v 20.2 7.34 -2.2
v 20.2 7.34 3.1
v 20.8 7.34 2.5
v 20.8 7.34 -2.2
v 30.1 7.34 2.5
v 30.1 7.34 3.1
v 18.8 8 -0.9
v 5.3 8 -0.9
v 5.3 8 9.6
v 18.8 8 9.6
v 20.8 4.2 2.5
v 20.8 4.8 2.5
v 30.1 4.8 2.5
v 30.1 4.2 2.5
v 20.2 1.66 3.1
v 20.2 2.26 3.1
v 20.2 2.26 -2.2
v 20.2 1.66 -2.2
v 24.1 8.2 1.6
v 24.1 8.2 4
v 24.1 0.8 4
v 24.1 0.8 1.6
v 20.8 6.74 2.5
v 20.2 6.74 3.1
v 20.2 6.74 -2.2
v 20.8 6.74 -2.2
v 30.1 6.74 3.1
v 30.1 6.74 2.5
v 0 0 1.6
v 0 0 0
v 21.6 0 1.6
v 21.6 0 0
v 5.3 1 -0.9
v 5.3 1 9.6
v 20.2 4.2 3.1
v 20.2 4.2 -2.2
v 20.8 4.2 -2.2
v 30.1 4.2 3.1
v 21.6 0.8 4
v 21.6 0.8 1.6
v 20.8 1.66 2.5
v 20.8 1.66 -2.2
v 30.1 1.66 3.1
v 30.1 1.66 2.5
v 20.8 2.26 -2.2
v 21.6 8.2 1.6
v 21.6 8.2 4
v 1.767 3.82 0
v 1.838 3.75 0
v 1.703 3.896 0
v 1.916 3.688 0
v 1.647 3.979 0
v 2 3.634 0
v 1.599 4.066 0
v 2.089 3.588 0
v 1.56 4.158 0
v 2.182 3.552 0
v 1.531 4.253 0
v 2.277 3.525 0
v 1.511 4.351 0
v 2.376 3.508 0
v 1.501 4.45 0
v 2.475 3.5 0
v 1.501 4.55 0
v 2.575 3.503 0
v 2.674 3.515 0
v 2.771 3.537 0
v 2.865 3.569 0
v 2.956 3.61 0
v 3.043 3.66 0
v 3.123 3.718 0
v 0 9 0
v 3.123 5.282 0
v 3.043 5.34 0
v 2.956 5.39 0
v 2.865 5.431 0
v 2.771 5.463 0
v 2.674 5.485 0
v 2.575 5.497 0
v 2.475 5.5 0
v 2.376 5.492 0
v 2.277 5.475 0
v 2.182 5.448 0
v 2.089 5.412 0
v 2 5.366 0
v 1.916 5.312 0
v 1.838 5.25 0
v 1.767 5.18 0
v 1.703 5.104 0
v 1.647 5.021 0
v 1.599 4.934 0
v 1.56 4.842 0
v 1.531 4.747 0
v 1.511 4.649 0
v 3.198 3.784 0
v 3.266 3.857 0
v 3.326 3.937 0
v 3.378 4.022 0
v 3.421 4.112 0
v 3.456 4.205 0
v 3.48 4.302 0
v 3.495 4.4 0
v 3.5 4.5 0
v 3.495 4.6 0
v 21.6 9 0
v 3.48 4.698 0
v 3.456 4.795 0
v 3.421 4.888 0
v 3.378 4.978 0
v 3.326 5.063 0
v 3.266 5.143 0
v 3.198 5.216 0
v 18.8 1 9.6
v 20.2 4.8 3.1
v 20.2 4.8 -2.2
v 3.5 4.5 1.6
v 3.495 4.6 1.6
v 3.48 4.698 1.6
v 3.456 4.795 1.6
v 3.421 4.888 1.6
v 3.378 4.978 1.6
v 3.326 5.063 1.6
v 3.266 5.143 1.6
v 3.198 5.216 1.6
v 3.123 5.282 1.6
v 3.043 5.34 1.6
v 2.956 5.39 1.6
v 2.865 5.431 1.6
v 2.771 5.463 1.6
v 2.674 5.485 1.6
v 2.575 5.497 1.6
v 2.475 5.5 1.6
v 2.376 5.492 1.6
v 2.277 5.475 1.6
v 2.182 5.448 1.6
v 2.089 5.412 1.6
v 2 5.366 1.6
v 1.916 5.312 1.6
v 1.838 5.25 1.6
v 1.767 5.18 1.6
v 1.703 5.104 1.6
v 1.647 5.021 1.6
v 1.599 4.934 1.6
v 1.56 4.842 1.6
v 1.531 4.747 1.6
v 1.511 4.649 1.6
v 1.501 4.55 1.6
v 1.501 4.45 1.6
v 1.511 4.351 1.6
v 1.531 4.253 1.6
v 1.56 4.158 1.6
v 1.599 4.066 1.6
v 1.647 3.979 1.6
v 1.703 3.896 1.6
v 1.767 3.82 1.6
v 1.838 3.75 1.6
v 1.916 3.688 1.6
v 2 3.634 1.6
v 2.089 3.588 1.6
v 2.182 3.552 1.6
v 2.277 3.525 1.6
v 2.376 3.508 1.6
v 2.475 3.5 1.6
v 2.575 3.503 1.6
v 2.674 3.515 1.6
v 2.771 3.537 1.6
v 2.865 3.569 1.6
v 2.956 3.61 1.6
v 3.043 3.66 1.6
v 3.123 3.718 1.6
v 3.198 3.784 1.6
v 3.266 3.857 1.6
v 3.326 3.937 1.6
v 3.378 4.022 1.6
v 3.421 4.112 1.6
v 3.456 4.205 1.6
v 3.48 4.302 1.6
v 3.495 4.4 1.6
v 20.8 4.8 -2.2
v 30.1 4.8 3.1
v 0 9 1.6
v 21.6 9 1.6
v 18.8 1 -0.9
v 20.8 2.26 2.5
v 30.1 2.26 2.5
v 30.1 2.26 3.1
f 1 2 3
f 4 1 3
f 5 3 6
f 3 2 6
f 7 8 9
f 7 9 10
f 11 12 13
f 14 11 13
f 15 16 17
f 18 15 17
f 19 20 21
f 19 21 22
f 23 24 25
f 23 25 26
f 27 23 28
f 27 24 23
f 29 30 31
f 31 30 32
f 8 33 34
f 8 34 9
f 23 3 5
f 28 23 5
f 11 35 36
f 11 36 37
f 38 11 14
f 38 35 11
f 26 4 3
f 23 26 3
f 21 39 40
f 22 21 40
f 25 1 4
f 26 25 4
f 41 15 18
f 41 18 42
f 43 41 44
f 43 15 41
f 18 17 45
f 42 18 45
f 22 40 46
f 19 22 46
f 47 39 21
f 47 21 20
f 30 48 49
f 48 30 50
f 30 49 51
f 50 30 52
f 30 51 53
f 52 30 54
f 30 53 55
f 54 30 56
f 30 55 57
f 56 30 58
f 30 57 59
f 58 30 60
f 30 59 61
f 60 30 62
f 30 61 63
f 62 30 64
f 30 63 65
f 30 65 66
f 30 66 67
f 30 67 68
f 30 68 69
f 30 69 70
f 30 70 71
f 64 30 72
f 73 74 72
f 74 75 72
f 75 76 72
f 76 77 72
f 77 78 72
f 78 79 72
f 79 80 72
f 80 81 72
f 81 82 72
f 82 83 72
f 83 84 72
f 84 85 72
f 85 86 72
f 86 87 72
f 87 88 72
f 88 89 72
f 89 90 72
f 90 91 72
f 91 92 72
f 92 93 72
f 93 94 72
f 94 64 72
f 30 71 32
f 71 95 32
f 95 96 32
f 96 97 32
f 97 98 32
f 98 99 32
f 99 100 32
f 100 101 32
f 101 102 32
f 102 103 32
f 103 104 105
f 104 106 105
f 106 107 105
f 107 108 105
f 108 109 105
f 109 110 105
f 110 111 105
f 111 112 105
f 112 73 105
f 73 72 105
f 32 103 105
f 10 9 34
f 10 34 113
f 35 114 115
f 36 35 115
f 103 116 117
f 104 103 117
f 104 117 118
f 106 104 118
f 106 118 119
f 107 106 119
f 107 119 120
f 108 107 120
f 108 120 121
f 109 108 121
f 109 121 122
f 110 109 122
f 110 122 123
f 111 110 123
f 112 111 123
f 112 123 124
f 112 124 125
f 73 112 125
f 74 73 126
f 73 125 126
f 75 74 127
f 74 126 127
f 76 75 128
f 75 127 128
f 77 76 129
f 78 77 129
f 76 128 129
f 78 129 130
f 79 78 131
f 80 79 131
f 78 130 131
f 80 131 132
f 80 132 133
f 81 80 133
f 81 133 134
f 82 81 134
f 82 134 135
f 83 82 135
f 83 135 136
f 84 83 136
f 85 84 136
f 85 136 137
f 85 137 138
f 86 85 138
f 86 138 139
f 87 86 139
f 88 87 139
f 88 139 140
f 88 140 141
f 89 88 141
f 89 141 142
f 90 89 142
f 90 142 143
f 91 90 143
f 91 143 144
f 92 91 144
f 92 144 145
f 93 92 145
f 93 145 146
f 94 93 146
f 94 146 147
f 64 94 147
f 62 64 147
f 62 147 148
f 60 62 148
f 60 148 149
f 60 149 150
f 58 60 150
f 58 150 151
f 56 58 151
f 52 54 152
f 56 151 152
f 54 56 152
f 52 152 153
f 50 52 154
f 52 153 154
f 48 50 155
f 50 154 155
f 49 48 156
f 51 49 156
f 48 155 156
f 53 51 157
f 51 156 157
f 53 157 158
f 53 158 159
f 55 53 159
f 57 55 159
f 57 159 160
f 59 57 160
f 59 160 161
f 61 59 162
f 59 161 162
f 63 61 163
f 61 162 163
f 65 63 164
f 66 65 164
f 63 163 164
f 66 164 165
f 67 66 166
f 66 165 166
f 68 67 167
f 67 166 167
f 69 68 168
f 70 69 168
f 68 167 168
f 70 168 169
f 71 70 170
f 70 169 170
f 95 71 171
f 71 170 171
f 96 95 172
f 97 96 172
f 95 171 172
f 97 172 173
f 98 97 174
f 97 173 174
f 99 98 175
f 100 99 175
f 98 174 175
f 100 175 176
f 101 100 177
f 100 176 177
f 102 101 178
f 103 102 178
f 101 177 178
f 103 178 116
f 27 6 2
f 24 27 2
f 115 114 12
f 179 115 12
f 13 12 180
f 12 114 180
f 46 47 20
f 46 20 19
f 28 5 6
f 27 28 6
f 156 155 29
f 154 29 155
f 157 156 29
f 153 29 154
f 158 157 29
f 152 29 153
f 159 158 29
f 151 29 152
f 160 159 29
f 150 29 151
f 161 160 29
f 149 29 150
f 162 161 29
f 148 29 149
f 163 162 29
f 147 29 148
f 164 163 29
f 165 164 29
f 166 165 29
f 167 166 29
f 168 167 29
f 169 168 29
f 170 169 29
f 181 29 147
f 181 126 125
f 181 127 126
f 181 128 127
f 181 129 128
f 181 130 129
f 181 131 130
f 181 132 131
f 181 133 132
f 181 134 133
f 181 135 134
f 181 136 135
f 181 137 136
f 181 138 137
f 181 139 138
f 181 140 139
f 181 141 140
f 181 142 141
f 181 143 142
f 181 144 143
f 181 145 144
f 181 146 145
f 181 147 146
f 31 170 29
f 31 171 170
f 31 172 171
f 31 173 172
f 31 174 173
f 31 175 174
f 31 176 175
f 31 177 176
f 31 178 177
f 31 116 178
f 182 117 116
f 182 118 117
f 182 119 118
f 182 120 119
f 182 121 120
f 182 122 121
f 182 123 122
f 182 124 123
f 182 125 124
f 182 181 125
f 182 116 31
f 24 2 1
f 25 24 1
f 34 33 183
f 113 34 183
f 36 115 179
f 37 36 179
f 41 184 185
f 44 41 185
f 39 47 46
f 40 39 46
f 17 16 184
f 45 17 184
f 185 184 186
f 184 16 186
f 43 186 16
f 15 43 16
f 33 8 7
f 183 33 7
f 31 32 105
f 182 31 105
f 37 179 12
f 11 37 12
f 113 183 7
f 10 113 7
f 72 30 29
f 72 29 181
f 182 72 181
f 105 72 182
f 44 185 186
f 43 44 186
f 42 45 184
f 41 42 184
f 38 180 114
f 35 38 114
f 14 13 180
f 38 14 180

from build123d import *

# Parameters (mm, degrees)
ESQUISSE1_W                = 21.6
ESQUISSE1_H                = 9
BOSS_EXTRU_1_DEPTH         = 1.6
BOSS_EXTRU_2_DEPTH         = 8
BOSS_EXTRU_2_DEPTH_BACK    = 2.5
ESQUISSE2_W                = 13.5
ESQUISSE2_H                = 7
ESQUISSE3_R                = 1
ENL_V_MAT_EXTRU_1_DEPTH    = 25.729739182
ESQUISSE4_W                = 2.4
ESQUISSE4_H                = 7.4
BOSS_EXTRU_3_DEPTH         = 2.5
BOSS_EXTRU_5_START         = -1.46
BOSS_EXTRU_5_DEPTH         = 0.6
R_P_TITION_LIN_AIRE1_COUNT = 3
R_P_TITION_LIN_AIRE1_PITCH = 2.54


with BuildPart() as part:
    # Esquisse1 → Boss.-Extru.1 (new body)
    with BuildSketch(Plane.XY):
        with Locations((10.8, 4.5)):
            Rectangle(ESQUISSE1_W, ESQUISSE1_H)
    extrude(amount=BOSS_EXTRU_1_DEPTH)

    # Esquisse3 → Enlèv. mat.-Extru.1 (cut, through all)
    with BuildSketch(Plane.XY.offset(1.6)):
        with Locations((2.5, 4.5)):
            Circle(ESQUISSE3_R)
    extrude(amount=-ENL_V_MAT_EXTRU_1_DEPTH, mode=Mode.SUBTRACT)


with BuildPart() as body_2:
    # Esquisse2 → Boss.-Extru.2 (new, two sides: drawn at the far end of the back side and taken through both)
    with BuildSketch(Plane.XY.offset(1.6).offset(-BOSS_EXTRU_2_DEPTH_BACK)):
        with Locations((12.05, 4.5)):
            Rectangle(ESQUISSE2_W, ESQUISSE2_H)
    extrude(amount=BOSS_EXTRU_2_DEPTH + BOSS_EXTRU_2_DEPTH_BACK)


with BuildPart() as body_3:
    # Esquisse4 → Boss.-Extru.3 (new body)
    with BuildSketch(Plane(origin=(21.6, 0, 0), x_dir=(0, 0, -1), z_dir=(1, 0, 0))):
        with Locations((-2.8, 4.5)):
            Rectangle(ESQUISSE4_W, ESQUISSE4_H)
    extrude(amount=BOSS_EXTRU_3_DEPTH)


with BuildPart() as body_4:
    # Esquisse5 → Boss.-Extru.5 (new body)
    with BuildSketch(Plane.XZ.offset(-0.8).offset(BOSS_EXTRU_5_START)):
        Polygon((30.1, 3.1), (20.2, 3.1), (20.2, -2.2), (20.8, -2.2), (20.8, 2.5), (30.1, 2.5), align=None)
    extrude(amount=BOSS_EXTRU_5_DEPTH)


with BuildPart() as r_p_tition_lin_aire1_1:
    # Répétition linéaire1: pattern copy
    add(body_4.part.moved(Location(Vector(0, 1, 0) * (1 * R_P_TITION_LIN_AIRE1_PITCH))))


with BuildPart() as r_p_tition_lin_aire1_2:
    # Répétition linéaire1: pattern copy
    add(body_4.part.moved(Location(Vector(0, 1, 0) * (2 * R_P_TITION_LIN_AIRE1_PITCH))))


solid = Compound([part.part, body_2.part, body_3.part, body_4.part, r_p_tition_lin_aire1_1.part, r_p_tition_lin_aire1_2.part])
